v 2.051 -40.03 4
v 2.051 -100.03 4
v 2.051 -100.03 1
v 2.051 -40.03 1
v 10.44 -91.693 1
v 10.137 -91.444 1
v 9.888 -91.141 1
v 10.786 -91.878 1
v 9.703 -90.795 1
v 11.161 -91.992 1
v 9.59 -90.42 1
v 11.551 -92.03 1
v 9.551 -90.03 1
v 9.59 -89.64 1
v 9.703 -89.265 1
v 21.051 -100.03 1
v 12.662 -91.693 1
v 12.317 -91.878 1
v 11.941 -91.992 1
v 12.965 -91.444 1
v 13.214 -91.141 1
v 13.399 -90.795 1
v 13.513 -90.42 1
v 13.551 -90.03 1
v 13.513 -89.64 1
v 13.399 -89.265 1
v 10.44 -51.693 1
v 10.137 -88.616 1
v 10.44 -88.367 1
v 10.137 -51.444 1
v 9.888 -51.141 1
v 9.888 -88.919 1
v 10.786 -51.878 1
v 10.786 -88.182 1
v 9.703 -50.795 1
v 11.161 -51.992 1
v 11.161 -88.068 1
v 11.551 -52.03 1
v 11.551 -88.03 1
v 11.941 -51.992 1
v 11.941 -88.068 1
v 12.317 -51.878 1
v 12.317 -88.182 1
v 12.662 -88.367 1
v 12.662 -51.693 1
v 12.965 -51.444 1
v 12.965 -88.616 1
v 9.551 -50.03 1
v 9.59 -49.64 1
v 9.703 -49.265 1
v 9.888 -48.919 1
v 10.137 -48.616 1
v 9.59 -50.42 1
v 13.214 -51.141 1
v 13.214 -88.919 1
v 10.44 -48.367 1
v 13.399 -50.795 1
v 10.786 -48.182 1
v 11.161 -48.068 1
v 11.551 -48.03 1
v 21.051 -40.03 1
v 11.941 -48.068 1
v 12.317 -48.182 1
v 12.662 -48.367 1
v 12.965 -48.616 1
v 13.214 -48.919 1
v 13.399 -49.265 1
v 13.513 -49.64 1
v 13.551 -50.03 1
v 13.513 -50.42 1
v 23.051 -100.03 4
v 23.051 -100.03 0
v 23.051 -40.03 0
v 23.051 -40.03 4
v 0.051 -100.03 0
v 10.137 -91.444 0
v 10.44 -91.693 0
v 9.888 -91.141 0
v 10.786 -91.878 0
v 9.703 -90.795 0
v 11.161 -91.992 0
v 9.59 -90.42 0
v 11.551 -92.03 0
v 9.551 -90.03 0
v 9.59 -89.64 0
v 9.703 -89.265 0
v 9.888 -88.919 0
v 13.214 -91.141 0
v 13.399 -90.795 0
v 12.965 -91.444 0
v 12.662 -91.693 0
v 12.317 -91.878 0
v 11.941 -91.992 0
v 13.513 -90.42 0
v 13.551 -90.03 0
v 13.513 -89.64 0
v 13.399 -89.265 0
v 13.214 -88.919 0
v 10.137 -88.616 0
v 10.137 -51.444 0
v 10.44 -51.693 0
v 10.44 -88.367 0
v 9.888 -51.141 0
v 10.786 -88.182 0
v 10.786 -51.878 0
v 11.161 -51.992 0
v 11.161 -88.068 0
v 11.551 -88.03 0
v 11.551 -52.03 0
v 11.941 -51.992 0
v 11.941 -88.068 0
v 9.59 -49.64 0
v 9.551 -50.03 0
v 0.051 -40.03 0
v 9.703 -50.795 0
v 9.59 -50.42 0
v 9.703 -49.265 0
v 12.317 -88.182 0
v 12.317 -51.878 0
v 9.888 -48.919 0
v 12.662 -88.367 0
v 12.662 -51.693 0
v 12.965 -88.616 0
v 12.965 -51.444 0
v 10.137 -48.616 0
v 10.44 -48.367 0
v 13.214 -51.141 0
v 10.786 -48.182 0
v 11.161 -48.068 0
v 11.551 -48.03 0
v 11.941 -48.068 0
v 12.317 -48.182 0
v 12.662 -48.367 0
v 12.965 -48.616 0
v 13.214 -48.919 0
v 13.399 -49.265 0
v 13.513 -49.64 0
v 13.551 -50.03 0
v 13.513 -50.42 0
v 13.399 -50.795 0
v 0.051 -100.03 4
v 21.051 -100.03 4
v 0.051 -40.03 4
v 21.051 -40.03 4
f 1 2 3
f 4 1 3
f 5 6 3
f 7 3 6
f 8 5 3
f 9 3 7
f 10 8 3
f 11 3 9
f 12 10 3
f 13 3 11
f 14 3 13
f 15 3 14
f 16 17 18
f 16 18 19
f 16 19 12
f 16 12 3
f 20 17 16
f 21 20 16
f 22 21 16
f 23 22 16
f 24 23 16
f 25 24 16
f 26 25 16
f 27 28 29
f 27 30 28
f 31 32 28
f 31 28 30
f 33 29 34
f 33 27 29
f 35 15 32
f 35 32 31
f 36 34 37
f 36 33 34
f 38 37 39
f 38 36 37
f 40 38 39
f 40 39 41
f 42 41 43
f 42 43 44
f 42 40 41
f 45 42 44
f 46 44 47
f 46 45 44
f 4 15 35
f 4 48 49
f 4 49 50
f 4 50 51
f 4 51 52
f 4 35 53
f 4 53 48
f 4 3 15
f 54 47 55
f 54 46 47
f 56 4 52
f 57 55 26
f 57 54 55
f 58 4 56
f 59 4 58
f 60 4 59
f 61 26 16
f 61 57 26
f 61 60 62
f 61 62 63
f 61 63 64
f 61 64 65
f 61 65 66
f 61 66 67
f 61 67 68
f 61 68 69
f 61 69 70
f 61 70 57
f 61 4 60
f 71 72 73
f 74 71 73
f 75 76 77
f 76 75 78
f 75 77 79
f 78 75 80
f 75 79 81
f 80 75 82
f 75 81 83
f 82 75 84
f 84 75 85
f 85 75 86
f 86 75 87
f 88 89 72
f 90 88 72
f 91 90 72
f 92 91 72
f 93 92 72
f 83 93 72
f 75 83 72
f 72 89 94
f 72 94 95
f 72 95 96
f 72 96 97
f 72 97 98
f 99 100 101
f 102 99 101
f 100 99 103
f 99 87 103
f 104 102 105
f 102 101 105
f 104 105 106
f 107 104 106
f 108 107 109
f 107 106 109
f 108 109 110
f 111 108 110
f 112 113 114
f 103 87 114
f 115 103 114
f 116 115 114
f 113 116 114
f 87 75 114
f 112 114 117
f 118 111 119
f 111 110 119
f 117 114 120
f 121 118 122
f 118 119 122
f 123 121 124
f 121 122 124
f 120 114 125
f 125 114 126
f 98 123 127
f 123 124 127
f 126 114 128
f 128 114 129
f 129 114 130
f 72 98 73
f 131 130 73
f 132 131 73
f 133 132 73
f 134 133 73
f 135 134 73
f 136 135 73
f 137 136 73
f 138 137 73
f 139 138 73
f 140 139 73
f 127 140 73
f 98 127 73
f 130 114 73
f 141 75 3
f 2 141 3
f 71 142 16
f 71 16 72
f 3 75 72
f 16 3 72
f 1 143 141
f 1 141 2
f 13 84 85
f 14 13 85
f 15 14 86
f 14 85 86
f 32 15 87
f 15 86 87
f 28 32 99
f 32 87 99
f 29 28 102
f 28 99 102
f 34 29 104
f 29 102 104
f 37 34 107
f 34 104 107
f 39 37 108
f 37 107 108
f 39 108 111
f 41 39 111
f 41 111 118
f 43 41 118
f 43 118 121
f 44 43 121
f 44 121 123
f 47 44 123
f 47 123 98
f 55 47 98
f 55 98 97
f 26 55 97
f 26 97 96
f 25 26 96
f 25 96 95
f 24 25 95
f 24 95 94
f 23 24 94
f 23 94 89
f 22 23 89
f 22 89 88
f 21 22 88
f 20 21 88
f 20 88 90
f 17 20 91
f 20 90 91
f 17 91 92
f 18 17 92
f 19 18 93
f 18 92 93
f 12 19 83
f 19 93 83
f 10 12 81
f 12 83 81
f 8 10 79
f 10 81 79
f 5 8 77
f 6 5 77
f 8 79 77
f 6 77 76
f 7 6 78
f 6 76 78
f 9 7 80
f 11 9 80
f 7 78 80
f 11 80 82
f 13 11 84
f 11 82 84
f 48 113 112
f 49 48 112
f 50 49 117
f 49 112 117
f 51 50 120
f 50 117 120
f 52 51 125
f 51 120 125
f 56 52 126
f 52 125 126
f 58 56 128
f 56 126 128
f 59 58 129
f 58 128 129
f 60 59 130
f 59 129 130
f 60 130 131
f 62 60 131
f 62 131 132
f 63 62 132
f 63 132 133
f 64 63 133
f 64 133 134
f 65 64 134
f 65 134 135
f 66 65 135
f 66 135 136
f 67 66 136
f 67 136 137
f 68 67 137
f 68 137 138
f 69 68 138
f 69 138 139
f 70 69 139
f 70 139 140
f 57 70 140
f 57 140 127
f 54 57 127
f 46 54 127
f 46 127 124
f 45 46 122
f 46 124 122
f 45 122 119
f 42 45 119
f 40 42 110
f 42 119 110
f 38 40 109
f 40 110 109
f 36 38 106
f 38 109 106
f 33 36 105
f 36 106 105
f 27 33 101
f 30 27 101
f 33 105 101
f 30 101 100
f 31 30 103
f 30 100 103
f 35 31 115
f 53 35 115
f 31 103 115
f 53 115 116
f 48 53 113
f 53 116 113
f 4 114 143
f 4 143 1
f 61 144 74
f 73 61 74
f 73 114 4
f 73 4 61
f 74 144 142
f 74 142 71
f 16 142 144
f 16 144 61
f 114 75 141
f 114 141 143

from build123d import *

# Parameters (mm, degrees)
SKETCH1_W           = 23
SKETCH1_H           = 60
BOSS_EXTRUDE1_DEPTH = 4
SKETCH2_W           = 19
SKETCH2_H           = 3.65261657
CUT_EXTRUDE1_DEPTH  = 65.399961729
SKETCH4_R           = 2
CUT_EXTRUDE2_DEPTH  = 103.729507508


with BuildPart() as part:
    # Sketch1 → Boss-Extrude1 (new body)
    with BuildSketch(Plane.XY):
        with Locations((11.551140333, -70.029978717)):
            Rectangle(SKETCH1_W, SKETCH1_H)
    extrude(amount=BOSS_EXTRUDE1_DEPTH)

    # Sketch2 → Cut-Extrude1 (cut, through all)
    with BuildSketch(Plane(origin=(0, -40.029978717, 0), x_dir=(1, 0, 0), z_dir=(0, 1, 0))):
        with Locations((11.551140333, -2.826308285)):
            Rectangle(SKETCH2_W, SKETCH2_H)
    extrude(amount=-CUT_EXTRUDE1_DEPTH, mode=Mode.SUBTRACT)

    # Sketch4 → Cut-Extrude2 (cut, through all)
    with BuildSketch(Plane(origin=(0, 0, 0), x_dir=(-1, 0, 0), z_dir=(0, 0, -1))):
        with Locations((-11.551140333, -50.029978717)):
            Circle(SKETCH4_R)
        with Locations((-11.551140333, -90.029978717)):
            Circle(SKETCH4_R)
    extrude(amount=-CUT_EXTRUDE2_DEPTH, mode=Mode.SUBTRACT)


solid = part.part
